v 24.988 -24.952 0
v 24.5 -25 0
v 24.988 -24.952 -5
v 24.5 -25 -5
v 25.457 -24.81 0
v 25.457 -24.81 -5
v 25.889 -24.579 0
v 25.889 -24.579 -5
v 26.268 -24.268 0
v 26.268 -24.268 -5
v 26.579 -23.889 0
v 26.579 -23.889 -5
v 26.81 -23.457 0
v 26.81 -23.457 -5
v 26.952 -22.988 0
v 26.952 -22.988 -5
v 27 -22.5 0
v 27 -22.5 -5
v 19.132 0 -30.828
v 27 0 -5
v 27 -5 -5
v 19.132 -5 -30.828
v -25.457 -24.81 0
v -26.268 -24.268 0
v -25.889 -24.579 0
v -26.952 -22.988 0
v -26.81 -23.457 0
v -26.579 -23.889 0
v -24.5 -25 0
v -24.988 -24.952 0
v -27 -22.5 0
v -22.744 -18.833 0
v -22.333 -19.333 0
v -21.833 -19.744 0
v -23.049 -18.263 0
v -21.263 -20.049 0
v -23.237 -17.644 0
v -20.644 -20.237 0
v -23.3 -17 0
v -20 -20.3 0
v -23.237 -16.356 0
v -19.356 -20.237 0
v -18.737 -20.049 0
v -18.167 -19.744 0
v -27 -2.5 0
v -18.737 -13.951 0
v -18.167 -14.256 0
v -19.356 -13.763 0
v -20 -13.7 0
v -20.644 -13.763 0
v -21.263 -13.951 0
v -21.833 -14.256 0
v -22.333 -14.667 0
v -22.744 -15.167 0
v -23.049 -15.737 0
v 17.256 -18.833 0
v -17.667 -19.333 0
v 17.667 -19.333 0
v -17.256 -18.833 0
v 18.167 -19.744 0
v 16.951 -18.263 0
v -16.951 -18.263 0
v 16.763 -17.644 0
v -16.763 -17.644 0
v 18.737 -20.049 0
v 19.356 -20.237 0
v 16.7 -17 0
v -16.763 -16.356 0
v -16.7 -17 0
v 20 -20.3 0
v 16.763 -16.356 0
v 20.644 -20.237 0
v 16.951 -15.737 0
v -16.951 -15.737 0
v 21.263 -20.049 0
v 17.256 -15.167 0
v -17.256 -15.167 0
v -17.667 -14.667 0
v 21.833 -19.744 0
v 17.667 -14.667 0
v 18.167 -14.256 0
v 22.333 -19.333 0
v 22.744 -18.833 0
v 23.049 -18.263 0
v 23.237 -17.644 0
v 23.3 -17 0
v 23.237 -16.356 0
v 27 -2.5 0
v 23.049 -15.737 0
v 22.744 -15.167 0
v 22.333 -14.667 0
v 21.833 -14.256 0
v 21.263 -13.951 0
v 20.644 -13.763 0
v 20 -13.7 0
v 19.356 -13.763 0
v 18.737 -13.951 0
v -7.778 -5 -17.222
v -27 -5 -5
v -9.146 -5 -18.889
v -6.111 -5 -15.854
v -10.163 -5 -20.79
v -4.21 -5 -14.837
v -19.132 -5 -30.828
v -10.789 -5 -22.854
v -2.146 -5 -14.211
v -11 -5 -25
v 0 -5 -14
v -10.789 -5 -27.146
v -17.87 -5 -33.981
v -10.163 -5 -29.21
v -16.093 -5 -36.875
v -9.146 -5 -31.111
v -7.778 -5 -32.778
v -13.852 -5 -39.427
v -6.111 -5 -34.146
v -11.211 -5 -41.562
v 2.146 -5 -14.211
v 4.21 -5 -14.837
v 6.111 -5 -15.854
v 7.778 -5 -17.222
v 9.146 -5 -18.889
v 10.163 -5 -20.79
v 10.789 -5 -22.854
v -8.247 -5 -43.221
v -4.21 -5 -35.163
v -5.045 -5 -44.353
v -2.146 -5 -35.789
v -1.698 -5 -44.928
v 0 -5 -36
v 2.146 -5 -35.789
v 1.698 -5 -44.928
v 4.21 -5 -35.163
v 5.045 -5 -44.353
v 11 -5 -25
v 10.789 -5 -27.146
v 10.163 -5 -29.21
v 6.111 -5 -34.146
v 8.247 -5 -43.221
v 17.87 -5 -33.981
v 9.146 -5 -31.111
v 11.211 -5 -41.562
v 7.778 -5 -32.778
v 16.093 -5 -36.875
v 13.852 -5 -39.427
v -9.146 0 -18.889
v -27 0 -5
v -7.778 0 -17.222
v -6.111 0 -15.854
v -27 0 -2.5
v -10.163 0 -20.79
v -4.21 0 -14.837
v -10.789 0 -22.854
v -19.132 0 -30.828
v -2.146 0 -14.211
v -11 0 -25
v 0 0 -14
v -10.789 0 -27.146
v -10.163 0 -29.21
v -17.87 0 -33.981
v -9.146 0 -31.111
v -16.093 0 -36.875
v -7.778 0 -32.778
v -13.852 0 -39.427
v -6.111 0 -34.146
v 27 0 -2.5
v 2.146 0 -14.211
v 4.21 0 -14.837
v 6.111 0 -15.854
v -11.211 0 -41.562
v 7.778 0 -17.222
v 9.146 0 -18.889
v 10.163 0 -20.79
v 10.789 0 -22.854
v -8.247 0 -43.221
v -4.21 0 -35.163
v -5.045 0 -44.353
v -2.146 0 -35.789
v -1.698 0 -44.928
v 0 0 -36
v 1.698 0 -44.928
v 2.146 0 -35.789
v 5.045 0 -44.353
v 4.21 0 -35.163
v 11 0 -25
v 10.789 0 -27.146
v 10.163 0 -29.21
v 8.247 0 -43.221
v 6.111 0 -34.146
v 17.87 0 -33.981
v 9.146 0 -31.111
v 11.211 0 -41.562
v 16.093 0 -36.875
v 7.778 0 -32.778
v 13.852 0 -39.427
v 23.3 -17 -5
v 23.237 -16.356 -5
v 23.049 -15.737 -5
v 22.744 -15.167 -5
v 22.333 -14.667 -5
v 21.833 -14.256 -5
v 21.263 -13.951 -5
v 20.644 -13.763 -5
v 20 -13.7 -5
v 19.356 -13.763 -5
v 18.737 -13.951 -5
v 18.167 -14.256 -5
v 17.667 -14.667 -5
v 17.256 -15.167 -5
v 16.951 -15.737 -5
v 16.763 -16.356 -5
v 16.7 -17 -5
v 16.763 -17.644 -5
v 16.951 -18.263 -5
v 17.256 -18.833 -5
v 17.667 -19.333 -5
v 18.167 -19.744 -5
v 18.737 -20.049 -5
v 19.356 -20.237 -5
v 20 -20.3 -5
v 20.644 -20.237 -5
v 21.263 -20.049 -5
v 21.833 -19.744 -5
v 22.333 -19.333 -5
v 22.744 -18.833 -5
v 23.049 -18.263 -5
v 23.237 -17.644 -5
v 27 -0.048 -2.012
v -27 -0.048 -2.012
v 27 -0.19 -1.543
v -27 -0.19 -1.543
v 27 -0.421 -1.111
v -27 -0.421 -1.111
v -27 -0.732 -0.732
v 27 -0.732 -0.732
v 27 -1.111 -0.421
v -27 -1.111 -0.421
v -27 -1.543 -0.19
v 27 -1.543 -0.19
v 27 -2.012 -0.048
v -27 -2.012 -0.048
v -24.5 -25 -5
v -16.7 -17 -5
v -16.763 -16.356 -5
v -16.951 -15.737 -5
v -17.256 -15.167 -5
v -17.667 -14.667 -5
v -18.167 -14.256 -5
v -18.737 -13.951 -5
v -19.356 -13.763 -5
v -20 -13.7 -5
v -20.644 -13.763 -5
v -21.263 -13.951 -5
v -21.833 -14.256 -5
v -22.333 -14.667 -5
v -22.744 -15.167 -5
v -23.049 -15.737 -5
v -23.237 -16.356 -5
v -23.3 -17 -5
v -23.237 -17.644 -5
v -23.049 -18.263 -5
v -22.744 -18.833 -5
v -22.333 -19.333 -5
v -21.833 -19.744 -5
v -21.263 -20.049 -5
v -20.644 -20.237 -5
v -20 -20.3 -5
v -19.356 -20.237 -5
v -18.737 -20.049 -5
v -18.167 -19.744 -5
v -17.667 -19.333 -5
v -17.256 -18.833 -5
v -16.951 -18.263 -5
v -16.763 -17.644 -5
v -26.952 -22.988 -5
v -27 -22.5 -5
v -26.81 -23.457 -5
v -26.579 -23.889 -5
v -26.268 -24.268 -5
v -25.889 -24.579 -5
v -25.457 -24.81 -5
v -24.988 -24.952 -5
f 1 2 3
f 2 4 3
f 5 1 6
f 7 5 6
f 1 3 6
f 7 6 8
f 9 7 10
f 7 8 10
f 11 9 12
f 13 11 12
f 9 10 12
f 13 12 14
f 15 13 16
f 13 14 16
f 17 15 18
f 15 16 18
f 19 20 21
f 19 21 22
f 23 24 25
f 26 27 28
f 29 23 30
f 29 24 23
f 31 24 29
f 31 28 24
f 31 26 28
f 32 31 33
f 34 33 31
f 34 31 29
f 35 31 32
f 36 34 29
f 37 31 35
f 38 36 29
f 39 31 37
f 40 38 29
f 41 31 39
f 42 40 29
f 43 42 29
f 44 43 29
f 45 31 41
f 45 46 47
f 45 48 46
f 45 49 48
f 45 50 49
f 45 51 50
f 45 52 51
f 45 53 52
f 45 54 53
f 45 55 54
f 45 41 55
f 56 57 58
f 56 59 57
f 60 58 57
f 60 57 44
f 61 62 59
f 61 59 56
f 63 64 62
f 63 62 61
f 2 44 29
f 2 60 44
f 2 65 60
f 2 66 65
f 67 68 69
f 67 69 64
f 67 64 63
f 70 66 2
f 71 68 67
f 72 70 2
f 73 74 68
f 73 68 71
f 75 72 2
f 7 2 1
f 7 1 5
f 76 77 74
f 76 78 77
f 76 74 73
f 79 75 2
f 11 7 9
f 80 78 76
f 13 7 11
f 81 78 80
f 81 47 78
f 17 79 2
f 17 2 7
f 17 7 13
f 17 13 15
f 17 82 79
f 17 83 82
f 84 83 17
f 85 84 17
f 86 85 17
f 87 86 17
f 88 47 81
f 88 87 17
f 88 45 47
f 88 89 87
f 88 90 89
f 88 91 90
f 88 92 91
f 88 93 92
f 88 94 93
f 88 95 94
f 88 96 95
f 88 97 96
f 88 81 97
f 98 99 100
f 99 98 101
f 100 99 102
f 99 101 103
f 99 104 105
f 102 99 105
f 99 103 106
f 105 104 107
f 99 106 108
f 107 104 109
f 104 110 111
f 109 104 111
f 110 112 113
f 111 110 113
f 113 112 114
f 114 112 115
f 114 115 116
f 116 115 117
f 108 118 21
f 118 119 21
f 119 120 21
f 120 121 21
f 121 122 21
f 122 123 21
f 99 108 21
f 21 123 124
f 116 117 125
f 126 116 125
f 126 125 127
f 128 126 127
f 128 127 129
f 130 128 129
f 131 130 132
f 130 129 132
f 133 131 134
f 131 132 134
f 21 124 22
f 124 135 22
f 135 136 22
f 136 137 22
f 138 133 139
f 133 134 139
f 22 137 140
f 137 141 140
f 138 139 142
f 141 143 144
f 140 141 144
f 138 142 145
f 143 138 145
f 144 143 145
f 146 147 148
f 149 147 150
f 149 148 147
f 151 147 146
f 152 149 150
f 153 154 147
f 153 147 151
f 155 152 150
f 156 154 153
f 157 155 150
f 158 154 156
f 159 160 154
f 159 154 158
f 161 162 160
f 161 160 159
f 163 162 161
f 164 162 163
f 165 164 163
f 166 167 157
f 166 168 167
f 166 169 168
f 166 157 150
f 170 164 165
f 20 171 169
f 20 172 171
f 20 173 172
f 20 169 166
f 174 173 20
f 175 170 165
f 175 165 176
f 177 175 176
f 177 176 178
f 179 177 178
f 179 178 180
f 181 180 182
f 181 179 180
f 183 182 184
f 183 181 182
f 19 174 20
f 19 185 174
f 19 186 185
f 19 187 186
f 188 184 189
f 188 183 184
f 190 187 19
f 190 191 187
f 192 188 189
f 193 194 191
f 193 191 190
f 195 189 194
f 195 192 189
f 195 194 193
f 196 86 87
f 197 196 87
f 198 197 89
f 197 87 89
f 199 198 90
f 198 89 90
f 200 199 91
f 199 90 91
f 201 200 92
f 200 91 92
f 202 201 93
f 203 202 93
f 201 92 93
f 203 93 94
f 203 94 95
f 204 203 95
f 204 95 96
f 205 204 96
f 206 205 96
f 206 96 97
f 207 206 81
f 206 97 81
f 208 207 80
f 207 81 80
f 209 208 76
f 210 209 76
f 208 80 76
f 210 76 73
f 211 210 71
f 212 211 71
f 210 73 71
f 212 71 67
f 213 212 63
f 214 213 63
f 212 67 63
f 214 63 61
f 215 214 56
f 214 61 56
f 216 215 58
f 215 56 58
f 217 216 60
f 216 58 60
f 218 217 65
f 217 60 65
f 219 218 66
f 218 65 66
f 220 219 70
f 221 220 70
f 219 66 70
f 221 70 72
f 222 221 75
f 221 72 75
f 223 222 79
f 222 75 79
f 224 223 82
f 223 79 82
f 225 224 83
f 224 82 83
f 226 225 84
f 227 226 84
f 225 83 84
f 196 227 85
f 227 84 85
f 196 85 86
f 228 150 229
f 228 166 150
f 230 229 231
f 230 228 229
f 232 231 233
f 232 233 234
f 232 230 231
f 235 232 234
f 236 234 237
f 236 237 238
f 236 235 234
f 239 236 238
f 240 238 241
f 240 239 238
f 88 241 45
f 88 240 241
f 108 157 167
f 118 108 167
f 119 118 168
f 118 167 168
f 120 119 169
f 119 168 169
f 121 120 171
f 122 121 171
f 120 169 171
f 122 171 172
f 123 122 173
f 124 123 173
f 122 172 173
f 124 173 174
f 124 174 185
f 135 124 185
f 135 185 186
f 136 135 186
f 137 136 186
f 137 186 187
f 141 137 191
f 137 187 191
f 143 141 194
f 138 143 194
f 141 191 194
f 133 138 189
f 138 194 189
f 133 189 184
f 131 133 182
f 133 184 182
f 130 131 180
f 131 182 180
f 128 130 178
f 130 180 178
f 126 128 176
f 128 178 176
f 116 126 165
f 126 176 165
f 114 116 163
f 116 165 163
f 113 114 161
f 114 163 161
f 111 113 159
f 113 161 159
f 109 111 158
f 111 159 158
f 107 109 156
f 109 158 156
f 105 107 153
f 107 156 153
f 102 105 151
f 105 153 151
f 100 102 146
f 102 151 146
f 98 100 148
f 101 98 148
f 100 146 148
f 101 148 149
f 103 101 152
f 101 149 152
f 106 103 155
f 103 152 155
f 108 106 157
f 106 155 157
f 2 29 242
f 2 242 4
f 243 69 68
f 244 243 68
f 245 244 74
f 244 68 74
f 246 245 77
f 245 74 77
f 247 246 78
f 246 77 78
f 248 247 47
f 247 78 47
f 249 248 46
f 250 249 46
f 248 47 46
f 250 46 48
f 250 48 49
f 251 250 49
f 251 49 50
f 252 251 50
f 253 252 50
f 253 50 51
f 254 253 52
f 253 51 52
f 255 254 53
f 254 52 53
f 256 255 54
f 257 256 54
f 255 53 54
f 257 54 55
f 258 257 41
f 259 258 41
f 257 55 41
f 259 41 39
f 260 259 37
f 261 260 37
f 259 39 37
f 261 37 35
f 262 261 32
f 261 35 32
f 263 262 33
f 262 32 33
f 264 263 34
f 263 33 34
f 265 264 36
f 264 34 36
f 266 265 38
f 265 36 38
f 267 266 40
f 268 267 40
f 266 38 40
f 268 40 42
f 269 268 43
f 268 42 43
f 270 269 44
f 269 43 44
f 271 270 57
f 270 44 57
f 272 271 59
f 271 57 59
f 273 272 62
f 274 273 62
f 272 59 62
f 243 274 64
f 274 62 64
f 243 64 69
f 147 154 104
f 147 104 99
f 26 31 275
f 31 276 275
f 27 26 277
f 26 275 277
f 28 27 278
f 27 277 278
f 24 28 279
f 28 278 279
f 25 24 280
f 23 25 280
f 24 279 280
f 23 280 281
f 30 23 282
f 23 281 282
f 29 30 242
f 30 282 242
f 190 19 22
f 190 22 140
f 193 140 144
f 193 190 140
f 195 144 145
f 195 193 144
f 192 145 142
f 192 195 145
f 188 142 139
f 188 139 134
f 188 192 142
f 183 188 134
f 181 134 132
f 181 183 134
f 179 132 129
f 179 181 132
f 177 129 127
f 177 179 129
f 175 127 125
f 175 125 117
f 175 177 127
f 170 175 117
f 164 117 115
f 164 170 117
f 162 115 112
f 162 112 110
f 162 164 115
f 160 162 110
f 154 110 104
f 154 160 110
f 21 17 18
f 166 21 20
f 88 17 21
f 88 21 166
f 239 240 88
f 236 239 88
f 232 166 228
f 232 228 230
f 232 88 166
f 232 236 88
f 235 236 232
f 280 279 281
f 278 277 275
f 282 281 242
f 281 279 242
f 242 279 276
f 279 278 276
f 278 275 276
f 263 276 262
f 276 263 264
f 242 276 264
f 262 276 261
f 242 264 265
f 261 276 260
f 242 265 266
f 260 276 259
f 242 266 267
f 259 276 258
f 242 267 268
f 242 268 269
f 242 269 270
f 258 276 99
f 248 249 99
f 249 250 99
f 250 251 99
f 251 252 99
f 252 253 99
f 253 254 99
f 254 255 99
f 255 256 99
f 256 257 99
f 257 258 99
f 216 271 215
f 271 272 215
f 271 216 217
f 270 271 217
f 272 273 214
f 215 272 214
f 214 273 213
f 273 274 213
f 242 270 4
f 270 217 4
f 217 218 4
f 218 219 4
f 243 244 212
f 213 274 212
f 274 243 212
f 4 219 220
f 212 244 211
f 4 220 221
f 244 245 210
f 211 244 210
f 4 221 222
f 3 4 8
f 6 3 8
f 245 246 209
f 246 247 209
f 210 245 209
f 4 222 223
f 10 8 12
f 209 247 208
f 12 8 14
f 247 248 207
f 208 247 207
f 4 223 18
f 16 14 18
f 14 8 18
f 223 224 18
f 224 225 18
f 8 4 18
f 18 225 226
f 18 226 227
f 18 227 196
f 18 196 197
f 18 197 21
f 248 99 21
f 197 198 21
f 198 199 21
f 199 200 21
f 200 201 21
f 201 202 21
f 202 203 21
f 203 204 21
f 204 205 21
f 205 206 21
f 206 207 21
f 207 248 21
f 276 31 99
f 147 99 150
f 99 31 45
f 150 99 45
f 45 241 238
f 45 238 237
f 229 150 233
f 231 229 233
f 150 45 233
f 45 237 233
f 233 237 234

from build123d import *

# Parameters (mm, degrees)
CROQUIS1_R              = 11
SALIENTE_EXTRUIR1_DEPTH = 5
CROQUIS2_W              = 54
CROQUIS2_H              = 25
CROQUIS2_R              = 3.3
SALIENTE_EXTRUIR2_DEPTH = 5
REDONDEO1_R             = 2.5
REDONDEO2_R             = 2.5


with BuildPart() as part:
    # Croquis1 → Saliente-Extruir1 (new body)
    with BuildSketch(Plane(origin=(0, 0, 0), x_dir=(1, 0, 0), z_dir=(0, 1, 0))):
        with BuildLine():
            Line((-27, 0), (27, 0))
            Line((27, 0), (27, 5))
            Line((27, 5), (19.131975199, 30.828166519))
            ThreePointArc((19.131975199, 30.828166519), (0, 45), (-19.131975199, 30.828166519))
            Line((-19.131975199, 30.828166519), (-27, 5))
            Line((-27, 5), (-27, 0))
        make_face()
        with Locations(Location((0, 25, 0), (0, 0, 270))):
            Circle(CROQUIS1_R, mode=Mode.SUBTRACT)
    extrude(amount=-SALIENTE_EXTRUIR1_DEPTH)

    # Croquis2 → Saliente-Extruir2 (add)
    with BuildSketch(Plane.XY):
        with Locations((0, -12.5)):
            Rectangle(CROQUIS2_W, CROQUIS2_H)
        with Locations((20, -17)):
            Circle(CROQUIS2_R, mode=Mode.SUBTRACT)
        with Locations((-20, -17)):
            Circle(CROQUIS2_R, mode=Mode.SUBTRACT)
    extrude(amount=-SALIENTE_EXTRUIR2_DEPTH)

    # Redondeo1
    redondeo1_edges = [part.edges().sort_by_distance(p)[0] for p in [
        (0, 0, 0),
    ]]
    fillet(redondeo1_edges, radius=REDONDEO1_R)

    # Redondeo2
    redondeo2_edges = [part.edges().sort_by_distance(p)[0] for p in [
        (-27, -25, -2.5),
        (27, -25, -2.5),
    ]]
    fillet(redondeo2_edges, radius=REDONDEO2_R)


solid = part.part
